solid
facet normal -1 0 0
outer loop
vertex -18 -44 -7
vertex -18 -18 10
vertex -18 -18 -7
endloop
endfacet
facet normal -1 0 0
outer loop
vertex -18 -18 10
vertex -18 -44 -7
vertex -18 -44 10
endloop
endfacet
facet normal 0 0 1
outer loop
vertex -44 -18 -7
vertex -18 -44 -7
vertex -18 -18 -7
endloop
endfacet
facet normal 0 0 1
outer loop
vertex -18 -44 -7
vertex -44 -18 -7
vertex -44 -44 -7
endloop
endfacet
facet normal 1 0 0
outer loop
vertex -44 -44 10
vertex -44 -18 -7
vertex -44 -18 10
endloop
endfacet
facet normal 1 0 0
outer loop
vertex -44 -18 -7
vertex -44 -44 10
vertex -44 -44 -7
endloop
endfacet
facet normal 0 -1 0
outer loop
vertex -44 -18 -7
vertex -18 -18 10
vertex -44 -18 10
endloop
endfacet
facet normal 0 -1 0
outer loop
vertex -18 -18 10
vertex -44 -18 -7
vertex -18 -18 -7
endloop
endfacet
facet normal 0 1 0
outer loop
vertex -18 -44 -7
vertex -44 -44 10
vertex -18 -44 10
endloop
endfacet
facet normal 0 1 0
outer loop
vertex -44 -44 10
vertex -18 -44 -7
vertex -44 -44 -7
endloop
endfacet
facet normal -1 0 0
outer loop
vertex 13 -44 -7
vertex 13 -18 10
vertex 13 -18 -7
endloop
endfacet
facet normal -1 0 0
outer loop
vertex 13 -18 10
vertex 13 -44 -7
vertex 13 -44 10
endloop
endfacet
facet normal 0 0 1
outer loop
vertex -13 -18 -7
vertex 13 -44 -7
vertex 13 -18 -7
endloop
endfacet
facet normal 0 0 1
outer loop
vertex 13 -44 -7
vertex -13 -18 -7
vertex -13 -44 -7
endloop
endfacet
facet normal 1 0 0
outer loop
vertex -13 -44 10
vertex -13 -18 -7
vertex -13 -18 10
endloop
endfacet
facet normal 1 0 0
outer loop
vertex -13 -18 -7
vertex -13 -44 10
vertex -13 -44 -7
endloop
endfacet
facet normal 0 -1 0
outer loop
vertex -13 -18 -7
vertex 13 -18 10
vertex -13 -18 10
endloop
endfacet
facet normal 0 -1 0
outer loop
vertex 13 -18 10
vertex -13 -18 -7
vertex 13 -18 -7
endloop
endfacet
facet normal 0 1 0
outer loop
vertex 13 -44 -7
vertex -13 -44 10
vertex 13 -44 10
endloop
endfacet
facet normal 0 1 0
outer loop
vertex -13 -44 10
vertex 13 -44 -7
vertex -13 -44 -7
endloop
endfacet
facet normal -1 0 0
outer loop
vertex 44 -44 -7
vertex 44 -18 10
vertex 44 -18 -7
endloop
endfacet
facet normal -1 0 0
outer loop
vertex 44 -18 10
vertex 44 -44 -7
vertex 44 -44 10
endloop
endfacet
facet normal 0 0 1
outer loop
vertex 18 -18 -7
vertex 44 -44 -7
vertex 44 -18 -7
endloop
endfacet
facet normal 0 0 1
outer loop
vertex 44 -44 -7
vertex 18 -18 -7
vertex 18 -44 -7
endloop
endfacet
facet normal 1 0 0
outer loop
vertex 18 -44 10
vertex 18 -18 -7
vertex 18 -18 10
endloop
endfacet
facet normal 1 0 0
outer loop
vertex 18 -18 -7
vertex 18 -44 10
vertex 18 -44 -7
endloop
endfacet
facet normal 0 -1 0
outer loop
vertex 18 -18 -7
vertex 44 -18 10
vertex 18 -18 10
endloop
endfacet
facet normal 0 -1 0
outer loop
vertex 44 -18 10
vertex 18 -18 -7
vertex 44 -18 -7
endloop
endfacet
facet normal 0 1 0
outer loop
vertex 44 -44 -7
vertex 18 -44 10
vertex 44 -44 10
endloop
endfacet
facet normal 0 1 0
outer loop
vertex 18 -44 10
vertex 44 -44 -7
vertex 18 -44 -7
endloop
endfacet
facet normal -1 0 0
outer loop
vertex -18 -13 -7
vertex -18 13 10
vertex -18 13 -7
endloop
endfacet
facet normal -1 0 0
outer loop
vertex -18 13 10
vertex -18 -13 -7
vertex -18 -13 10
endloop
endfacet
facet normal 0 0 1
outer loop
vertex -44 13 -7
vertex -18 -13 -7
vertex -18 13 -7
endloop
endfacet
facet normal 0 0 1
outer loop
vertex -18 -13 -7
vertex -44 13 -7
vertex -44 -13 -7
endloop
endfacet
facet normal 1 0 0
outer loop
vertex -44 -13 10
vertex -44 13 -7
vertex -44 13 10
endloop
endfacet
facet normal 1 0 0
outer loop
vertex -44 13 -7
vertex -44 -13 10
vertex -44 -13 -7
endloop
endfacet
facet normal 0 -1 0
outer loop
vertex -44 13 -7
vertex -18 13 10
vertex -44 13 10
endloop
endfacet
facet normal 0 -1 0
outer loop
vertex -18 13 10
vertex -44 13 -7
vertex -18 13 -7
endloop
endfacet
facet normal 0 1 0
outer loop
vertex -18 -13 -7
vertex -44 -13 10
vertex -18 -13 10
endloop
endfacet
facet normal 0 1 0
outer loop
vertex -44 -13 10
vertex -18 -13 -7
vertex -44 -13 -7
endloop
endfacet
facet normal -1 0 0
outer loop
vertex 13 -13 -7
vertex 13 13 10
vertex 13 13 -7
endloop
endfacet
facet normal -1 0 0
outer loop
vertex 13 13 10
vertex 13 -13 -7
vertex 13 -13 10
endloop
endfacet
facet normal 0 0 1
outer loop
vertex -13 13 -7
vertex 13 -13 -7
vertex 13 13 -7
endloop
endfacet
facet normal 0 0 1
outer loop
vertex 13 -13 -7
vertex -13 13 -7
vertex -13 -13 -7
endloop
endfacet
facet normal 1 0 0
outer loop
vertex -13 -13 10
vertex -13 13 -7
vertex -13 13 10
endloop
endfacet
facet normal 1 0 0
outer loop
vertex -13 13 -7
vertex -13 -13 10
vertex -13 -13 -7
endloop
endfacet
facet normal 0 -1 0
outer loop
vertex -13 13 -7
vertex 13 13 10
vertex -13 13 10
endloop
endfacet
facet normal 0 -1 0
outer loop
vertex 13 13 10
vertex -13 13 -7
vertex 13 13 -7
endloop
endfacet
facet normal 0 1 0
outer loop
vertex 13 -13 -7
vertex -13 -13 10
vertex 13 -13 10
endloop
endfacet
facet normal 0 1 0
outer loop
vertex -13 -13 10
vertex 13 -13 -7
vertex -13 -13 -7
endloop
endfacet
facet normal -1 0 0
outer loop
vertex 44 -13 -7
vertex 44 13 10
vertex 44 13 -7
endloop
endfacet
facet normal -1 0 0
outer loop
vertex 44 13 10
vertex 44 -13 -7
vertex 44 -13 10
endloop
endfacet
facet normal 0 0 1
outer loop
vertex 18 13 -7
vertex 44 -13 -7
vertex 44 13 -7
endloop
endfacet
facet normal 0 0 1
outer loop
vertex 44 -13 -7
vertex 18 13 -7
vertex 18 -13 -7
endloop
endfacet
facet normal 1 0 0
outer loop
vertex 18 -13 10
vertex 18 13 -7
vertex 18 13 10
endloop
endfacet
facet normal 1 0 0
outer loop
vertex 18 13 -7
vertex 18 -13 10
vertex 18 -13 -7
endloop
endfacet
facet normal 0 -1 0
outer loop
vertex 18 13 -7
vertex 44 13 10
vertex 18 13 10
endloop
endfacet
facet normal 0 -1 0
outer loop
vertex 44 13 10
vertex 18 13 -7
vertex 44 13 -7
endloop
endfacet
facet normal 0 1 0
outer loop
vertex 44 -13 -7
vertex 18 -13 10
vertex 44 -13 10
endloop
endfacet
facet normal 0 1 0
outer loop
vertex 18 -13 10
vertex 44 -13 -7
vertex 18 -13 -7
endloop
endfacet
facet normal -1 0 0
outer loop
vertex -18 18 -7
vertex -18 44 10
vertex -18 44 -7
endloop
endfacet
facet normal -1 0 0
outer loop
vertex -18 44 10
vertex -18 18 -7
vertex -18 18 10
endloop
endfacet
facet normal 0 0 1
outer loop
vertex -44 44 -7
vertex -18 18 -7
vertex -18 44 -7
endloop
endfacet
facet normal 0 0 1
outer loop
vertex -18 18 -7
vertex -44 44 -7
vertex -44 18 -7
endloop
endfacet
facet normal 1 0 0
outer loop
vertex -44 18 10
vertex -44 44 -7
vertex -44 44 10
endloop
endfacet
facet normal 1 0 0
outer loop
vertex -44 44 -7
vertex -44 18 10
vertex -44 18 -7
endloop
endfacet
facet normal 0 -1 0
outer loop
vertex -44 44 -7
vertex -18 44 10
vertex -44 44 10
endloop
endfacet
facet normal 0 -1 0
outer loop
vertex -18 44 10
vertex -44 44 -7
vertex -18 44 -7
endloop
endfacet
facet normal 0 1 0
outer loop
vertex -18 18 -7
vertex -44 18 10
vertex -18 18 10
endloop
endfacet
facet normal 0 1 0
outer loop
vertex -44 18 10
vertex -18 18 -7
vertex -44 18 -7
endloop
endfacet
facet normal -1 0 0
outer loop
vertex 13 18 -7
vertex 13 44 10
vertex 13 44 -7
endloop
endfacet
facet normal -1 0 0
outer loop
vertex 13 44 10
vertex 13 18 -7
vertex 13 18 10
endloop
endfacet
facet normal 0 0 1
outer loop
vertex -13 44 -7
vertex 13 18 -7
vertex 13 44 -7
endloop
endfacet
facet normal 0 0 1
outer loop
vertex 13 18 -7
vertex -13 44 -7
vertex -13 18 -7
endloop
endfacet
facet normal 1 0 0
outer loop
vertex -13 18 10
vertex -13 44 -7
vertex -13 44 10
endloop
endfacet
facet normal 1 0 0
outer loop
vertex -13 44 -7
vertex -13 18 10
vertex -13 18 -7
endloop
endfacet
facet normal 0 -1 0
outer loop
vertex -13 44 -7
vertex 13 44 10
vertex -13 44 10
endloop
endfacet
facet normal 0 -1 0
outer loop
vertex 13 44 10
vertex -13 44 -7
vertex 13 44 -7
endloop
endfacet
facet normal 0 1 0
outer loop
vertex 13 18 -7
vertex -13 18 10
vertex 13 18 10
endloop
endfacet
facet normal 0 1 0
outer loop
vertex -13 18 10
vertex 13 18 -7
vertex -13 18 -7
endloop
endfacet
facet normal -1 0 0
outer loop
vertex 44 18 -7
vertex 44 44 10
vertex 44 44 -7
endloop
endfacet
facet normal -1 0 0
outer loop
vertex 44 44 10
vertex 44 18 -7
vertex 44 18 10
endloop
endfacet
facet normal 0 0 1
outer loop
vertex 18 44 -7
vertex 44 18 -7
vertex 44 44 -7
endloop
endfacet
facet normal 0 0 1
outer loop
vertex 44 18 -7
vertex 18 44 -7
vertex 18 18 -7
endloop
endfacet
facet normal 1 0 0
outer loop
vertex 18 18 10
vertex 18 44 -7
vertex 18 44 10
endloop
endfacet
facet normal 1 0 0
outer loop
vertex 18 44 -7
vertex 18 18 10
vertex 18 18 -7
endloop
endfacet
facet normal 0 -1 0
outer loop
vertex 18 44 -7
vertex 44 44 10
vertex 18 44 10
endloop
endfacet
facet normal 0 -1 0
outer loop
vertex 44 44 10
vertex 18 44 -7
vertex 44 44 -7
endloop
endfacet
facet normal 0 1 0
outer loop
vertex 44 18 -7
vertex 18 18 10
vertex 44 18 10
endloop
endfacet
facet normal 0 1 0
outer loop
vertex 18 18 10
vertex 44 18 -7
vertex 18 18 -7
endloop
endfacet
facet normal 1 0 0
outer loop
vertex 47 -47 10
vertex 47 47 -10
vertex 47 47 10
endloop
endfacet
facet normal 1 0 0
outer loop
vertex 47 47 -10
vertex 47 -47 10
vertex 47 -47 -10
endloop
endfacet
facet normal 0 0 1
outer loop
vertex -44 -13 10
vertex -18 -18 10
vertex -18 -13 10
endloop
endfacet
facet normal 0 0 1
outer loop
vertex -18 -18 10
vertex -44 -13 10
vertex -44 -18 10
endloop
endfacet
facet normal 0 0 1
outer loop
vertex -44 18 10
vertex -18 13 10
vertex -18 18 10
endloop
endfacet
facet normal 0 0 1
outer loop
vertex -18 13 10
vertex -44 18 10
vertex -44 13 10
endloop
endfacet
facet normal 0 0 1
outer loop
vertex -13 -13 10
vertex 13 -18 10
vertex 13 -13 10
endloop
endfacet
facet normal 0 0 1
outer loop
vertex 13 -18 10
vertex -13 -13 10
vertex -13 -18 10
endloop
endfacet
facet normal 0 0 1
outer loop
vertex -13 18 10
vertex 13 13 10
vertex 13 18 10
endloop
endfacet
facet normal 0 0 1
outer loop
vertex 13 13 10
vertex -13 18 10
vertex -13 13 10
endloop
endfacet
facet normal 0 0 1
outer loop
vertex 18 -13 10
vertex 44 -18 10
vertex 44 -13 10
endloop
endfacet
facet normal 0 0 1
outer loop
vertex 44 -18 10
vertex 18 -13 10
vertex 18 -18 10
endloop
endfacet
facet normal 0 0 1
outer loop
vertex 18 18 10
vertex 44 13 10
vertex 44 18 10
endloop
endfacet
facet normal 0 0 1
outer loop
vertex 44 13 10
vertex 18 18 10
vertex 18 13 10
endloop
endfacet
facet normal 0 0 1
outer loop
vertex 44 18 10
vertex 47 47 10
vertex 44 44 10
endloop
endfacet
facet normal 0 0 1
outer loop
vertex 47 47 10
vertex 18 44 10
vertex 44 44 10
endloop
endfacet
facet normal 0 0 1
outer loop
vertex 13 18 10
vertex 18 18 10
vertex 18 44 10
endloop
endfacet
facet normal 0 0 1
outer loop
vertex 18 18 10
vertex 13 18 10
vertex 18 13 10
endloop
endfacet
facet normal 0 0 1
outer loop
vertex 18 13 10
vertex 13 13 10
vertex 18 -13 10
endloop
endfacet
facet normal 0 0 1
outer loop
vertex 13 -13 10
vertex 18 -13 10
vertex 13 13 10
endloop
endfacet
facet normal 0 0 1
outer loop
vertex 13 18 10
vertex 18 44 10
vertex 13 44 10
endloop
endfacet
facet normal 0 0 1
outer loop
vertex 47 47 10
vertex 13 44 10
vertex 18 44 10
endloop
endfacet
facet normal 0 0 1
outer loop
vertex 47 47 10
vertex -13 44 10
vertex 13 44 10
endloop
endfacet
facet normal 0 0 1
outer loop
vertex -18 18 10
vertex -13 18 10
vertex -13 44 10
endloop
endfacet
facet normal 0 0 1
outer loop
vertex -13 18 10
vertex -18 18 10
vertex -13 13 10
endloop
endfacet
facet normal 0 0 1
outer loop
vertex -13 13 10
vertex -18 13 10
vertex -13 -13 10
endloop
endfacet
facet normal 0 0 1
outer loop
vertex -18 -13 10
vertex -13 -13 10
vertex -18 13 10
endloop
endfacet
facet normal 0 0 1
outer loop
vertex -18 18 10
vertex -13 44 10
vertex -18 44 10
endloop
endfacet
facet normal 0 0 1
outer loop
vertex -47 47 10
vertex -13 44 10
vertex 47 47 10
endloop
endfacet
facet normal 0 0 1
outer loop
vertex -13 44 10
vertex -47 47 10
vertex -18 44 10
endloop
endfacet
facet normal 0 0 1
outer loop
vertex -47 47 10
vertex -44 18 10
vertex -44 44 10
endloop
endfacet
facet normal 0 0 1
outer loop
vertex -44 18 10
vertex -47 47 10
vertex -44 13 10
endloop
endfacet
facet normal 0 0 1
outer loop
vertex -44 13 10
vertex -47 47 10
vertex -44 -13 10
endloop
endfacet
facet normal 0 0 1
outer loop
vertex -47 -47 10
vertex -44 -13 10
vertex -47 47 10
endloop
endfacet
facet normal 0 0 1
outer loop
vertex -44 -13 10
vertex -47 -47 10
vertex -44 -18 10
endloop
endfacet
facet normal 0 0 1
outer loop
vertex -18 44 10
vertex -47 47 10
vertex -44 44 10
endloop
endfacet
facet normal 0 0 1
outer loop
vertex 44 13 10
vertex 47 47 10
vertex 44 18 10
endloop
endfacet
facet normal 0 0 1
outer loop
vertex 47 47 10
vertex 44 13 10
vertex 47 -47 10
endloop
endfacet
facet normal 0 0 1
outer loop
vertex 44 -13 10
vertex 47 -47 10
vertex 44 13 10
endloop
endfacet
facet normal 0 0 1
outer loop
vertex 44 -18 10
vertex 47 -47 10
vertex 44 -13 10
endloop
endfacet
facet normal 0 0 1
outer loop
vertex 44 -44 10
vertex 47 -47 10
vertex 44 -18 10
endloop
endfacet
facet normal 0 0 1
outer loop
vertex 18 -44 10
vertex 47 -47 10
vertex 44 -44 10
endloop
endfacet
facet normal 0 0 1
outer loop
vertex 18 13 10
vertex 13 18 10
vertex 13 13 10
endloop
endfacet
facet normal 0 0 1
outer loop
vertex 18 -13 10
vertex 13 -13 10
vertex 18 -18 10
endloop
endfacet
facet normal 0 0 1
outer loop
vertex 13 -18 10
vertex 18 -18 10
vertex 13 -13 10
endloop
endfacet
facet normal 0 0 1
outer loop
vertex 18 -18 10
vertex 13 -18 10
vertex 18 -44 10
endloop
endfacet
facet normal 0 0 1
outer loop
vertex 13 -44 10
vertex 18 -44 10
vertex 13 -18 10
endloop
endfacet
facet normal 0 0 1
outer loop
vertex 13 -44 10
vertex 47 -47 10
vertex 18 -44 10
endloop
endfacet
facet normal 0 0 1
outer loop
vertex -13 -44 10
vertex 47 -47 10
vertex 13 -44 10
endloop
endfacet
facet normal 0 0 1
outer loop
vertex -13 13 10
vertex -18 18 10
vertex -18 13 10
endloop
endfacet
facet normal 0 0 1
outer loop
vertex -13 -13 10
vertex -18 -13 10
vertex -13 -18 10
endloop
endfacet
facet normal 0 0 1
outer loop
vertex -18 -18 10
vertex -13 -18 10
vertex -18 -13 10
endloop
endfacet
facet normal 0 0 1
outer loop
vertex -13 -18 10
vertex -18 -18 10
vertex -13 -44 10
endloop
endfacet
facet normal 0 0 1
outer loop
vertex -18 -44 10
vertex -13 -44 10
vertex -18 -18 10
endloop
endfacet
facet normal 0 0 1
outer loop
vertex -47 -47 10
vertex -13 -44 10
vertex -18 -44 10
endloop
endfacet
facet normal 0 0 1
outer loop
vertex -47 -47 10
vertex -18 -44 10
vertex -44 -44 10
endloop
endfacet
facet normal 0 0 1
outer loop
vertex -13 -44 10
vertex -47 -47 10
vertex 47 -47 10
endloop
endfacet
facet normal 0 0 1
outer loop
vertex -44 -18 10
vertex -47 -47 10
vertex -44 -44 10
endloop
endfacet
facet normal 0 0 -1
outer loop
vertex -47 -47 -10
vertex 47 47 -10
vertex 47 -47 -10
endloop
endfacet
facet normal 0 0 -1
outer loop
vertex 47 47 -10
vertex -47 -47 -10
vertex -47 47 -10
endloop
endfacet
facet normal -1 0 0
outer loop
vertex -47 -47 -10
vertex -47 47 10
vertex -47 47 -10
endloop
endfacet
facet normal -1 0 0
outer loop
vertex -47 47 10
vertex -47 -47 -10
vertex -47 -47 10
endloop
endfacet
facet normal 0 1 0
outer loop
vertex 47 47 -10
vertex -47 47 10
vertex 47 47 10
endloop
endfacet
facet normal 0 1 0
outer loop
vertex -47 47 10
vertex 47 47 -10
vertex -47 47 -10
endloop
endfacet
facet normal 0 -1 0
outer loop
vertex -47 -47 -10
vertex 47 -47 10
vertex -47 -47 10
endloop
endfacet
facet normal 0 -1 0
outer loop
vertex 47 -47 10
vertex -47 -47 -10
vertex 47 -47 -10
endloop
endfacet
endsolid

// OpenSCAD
$fn = 32;

// ----------------------------------------------------------------------
// Pocket plate 94 x 94 x 20
// 3 x 3 pockets 26 mm square, 17 mm deep
// ----------------------------------------------------------------------

// --- parameters (mm) ---
thickness = 20;  // plate thickness
seat_tol = 0.1;  // tolerance at the seating features
free_tol = 0.5;  // general tolerance on the free sizes
floor_t = 3;     // material left under each pocket
pocket = 26;     // pocket side length
pitch_x = 31;    // pocket pitch along X
pitch_y = 31;    // pocket pitch along Y
cols = 3;        // pockets per row
rows = 3;        // rows of pockets

// --- derived feature positions (mm) ---
depth = thickness - floor_t;        // = 17   pocket depth, down to the floor
span_x = (cols - 1) * pitch_x;      // = 62   distance between outer pockets
span_y = (rows - 1) * pitch_y;      // = 62   distance between outer pocket rows
origin_x = -span_x / 2;             // = -31   X of the first pocket
origin_y = -span_y / 2;             // = -31   Y of the first pocket
plate = [span_x + pocket + 6, span_y + pocket + 6, thickness];  // = [94, 94, 20]   overall size: pockets plus 3 mm of wall on each side
feature_centers = [
  [origin_x + 0 * pitch_x, origin_y + 0 * pitch_y],
  [origin_x + 1 * pitch_x, origin_y + 0 * pitch_y],
  [origin_x + 2 * pitch_x, origin_y + 0 * pitch_y],
  [origin_x + 0 * pitch_x, origin_y + 1 * pitch_y],
  [origin_x + 1 * pitch_x, origin_y + 1 * pitch_y],
  [origin_x + 2 * pitch_x, origin_y + 1 * pitch_y],
  [origin_x + 0 * pitch_x, origin_y + 2 * pitch_y],
  [origin_x + 1 * pitch_x, origin_y + 2 * pitch_y],
  [origin_x + 2 * pitch_x, origin_y + 2 * pitch_y]
];   // pocket centres, used verbatim by the cutter loop

// plate outline, then one pocket per centre in feature_centers
difference() {
  cube(plate, center = true);
  for (centre = feature_centers)
    translate([centre[0] - pocket / 2, centre[1] - pocket / 2, plate[2] / 2 - depth])
      cube([pocket, pocket, depth + 1]);  // centred on the declared pocket centre
}
